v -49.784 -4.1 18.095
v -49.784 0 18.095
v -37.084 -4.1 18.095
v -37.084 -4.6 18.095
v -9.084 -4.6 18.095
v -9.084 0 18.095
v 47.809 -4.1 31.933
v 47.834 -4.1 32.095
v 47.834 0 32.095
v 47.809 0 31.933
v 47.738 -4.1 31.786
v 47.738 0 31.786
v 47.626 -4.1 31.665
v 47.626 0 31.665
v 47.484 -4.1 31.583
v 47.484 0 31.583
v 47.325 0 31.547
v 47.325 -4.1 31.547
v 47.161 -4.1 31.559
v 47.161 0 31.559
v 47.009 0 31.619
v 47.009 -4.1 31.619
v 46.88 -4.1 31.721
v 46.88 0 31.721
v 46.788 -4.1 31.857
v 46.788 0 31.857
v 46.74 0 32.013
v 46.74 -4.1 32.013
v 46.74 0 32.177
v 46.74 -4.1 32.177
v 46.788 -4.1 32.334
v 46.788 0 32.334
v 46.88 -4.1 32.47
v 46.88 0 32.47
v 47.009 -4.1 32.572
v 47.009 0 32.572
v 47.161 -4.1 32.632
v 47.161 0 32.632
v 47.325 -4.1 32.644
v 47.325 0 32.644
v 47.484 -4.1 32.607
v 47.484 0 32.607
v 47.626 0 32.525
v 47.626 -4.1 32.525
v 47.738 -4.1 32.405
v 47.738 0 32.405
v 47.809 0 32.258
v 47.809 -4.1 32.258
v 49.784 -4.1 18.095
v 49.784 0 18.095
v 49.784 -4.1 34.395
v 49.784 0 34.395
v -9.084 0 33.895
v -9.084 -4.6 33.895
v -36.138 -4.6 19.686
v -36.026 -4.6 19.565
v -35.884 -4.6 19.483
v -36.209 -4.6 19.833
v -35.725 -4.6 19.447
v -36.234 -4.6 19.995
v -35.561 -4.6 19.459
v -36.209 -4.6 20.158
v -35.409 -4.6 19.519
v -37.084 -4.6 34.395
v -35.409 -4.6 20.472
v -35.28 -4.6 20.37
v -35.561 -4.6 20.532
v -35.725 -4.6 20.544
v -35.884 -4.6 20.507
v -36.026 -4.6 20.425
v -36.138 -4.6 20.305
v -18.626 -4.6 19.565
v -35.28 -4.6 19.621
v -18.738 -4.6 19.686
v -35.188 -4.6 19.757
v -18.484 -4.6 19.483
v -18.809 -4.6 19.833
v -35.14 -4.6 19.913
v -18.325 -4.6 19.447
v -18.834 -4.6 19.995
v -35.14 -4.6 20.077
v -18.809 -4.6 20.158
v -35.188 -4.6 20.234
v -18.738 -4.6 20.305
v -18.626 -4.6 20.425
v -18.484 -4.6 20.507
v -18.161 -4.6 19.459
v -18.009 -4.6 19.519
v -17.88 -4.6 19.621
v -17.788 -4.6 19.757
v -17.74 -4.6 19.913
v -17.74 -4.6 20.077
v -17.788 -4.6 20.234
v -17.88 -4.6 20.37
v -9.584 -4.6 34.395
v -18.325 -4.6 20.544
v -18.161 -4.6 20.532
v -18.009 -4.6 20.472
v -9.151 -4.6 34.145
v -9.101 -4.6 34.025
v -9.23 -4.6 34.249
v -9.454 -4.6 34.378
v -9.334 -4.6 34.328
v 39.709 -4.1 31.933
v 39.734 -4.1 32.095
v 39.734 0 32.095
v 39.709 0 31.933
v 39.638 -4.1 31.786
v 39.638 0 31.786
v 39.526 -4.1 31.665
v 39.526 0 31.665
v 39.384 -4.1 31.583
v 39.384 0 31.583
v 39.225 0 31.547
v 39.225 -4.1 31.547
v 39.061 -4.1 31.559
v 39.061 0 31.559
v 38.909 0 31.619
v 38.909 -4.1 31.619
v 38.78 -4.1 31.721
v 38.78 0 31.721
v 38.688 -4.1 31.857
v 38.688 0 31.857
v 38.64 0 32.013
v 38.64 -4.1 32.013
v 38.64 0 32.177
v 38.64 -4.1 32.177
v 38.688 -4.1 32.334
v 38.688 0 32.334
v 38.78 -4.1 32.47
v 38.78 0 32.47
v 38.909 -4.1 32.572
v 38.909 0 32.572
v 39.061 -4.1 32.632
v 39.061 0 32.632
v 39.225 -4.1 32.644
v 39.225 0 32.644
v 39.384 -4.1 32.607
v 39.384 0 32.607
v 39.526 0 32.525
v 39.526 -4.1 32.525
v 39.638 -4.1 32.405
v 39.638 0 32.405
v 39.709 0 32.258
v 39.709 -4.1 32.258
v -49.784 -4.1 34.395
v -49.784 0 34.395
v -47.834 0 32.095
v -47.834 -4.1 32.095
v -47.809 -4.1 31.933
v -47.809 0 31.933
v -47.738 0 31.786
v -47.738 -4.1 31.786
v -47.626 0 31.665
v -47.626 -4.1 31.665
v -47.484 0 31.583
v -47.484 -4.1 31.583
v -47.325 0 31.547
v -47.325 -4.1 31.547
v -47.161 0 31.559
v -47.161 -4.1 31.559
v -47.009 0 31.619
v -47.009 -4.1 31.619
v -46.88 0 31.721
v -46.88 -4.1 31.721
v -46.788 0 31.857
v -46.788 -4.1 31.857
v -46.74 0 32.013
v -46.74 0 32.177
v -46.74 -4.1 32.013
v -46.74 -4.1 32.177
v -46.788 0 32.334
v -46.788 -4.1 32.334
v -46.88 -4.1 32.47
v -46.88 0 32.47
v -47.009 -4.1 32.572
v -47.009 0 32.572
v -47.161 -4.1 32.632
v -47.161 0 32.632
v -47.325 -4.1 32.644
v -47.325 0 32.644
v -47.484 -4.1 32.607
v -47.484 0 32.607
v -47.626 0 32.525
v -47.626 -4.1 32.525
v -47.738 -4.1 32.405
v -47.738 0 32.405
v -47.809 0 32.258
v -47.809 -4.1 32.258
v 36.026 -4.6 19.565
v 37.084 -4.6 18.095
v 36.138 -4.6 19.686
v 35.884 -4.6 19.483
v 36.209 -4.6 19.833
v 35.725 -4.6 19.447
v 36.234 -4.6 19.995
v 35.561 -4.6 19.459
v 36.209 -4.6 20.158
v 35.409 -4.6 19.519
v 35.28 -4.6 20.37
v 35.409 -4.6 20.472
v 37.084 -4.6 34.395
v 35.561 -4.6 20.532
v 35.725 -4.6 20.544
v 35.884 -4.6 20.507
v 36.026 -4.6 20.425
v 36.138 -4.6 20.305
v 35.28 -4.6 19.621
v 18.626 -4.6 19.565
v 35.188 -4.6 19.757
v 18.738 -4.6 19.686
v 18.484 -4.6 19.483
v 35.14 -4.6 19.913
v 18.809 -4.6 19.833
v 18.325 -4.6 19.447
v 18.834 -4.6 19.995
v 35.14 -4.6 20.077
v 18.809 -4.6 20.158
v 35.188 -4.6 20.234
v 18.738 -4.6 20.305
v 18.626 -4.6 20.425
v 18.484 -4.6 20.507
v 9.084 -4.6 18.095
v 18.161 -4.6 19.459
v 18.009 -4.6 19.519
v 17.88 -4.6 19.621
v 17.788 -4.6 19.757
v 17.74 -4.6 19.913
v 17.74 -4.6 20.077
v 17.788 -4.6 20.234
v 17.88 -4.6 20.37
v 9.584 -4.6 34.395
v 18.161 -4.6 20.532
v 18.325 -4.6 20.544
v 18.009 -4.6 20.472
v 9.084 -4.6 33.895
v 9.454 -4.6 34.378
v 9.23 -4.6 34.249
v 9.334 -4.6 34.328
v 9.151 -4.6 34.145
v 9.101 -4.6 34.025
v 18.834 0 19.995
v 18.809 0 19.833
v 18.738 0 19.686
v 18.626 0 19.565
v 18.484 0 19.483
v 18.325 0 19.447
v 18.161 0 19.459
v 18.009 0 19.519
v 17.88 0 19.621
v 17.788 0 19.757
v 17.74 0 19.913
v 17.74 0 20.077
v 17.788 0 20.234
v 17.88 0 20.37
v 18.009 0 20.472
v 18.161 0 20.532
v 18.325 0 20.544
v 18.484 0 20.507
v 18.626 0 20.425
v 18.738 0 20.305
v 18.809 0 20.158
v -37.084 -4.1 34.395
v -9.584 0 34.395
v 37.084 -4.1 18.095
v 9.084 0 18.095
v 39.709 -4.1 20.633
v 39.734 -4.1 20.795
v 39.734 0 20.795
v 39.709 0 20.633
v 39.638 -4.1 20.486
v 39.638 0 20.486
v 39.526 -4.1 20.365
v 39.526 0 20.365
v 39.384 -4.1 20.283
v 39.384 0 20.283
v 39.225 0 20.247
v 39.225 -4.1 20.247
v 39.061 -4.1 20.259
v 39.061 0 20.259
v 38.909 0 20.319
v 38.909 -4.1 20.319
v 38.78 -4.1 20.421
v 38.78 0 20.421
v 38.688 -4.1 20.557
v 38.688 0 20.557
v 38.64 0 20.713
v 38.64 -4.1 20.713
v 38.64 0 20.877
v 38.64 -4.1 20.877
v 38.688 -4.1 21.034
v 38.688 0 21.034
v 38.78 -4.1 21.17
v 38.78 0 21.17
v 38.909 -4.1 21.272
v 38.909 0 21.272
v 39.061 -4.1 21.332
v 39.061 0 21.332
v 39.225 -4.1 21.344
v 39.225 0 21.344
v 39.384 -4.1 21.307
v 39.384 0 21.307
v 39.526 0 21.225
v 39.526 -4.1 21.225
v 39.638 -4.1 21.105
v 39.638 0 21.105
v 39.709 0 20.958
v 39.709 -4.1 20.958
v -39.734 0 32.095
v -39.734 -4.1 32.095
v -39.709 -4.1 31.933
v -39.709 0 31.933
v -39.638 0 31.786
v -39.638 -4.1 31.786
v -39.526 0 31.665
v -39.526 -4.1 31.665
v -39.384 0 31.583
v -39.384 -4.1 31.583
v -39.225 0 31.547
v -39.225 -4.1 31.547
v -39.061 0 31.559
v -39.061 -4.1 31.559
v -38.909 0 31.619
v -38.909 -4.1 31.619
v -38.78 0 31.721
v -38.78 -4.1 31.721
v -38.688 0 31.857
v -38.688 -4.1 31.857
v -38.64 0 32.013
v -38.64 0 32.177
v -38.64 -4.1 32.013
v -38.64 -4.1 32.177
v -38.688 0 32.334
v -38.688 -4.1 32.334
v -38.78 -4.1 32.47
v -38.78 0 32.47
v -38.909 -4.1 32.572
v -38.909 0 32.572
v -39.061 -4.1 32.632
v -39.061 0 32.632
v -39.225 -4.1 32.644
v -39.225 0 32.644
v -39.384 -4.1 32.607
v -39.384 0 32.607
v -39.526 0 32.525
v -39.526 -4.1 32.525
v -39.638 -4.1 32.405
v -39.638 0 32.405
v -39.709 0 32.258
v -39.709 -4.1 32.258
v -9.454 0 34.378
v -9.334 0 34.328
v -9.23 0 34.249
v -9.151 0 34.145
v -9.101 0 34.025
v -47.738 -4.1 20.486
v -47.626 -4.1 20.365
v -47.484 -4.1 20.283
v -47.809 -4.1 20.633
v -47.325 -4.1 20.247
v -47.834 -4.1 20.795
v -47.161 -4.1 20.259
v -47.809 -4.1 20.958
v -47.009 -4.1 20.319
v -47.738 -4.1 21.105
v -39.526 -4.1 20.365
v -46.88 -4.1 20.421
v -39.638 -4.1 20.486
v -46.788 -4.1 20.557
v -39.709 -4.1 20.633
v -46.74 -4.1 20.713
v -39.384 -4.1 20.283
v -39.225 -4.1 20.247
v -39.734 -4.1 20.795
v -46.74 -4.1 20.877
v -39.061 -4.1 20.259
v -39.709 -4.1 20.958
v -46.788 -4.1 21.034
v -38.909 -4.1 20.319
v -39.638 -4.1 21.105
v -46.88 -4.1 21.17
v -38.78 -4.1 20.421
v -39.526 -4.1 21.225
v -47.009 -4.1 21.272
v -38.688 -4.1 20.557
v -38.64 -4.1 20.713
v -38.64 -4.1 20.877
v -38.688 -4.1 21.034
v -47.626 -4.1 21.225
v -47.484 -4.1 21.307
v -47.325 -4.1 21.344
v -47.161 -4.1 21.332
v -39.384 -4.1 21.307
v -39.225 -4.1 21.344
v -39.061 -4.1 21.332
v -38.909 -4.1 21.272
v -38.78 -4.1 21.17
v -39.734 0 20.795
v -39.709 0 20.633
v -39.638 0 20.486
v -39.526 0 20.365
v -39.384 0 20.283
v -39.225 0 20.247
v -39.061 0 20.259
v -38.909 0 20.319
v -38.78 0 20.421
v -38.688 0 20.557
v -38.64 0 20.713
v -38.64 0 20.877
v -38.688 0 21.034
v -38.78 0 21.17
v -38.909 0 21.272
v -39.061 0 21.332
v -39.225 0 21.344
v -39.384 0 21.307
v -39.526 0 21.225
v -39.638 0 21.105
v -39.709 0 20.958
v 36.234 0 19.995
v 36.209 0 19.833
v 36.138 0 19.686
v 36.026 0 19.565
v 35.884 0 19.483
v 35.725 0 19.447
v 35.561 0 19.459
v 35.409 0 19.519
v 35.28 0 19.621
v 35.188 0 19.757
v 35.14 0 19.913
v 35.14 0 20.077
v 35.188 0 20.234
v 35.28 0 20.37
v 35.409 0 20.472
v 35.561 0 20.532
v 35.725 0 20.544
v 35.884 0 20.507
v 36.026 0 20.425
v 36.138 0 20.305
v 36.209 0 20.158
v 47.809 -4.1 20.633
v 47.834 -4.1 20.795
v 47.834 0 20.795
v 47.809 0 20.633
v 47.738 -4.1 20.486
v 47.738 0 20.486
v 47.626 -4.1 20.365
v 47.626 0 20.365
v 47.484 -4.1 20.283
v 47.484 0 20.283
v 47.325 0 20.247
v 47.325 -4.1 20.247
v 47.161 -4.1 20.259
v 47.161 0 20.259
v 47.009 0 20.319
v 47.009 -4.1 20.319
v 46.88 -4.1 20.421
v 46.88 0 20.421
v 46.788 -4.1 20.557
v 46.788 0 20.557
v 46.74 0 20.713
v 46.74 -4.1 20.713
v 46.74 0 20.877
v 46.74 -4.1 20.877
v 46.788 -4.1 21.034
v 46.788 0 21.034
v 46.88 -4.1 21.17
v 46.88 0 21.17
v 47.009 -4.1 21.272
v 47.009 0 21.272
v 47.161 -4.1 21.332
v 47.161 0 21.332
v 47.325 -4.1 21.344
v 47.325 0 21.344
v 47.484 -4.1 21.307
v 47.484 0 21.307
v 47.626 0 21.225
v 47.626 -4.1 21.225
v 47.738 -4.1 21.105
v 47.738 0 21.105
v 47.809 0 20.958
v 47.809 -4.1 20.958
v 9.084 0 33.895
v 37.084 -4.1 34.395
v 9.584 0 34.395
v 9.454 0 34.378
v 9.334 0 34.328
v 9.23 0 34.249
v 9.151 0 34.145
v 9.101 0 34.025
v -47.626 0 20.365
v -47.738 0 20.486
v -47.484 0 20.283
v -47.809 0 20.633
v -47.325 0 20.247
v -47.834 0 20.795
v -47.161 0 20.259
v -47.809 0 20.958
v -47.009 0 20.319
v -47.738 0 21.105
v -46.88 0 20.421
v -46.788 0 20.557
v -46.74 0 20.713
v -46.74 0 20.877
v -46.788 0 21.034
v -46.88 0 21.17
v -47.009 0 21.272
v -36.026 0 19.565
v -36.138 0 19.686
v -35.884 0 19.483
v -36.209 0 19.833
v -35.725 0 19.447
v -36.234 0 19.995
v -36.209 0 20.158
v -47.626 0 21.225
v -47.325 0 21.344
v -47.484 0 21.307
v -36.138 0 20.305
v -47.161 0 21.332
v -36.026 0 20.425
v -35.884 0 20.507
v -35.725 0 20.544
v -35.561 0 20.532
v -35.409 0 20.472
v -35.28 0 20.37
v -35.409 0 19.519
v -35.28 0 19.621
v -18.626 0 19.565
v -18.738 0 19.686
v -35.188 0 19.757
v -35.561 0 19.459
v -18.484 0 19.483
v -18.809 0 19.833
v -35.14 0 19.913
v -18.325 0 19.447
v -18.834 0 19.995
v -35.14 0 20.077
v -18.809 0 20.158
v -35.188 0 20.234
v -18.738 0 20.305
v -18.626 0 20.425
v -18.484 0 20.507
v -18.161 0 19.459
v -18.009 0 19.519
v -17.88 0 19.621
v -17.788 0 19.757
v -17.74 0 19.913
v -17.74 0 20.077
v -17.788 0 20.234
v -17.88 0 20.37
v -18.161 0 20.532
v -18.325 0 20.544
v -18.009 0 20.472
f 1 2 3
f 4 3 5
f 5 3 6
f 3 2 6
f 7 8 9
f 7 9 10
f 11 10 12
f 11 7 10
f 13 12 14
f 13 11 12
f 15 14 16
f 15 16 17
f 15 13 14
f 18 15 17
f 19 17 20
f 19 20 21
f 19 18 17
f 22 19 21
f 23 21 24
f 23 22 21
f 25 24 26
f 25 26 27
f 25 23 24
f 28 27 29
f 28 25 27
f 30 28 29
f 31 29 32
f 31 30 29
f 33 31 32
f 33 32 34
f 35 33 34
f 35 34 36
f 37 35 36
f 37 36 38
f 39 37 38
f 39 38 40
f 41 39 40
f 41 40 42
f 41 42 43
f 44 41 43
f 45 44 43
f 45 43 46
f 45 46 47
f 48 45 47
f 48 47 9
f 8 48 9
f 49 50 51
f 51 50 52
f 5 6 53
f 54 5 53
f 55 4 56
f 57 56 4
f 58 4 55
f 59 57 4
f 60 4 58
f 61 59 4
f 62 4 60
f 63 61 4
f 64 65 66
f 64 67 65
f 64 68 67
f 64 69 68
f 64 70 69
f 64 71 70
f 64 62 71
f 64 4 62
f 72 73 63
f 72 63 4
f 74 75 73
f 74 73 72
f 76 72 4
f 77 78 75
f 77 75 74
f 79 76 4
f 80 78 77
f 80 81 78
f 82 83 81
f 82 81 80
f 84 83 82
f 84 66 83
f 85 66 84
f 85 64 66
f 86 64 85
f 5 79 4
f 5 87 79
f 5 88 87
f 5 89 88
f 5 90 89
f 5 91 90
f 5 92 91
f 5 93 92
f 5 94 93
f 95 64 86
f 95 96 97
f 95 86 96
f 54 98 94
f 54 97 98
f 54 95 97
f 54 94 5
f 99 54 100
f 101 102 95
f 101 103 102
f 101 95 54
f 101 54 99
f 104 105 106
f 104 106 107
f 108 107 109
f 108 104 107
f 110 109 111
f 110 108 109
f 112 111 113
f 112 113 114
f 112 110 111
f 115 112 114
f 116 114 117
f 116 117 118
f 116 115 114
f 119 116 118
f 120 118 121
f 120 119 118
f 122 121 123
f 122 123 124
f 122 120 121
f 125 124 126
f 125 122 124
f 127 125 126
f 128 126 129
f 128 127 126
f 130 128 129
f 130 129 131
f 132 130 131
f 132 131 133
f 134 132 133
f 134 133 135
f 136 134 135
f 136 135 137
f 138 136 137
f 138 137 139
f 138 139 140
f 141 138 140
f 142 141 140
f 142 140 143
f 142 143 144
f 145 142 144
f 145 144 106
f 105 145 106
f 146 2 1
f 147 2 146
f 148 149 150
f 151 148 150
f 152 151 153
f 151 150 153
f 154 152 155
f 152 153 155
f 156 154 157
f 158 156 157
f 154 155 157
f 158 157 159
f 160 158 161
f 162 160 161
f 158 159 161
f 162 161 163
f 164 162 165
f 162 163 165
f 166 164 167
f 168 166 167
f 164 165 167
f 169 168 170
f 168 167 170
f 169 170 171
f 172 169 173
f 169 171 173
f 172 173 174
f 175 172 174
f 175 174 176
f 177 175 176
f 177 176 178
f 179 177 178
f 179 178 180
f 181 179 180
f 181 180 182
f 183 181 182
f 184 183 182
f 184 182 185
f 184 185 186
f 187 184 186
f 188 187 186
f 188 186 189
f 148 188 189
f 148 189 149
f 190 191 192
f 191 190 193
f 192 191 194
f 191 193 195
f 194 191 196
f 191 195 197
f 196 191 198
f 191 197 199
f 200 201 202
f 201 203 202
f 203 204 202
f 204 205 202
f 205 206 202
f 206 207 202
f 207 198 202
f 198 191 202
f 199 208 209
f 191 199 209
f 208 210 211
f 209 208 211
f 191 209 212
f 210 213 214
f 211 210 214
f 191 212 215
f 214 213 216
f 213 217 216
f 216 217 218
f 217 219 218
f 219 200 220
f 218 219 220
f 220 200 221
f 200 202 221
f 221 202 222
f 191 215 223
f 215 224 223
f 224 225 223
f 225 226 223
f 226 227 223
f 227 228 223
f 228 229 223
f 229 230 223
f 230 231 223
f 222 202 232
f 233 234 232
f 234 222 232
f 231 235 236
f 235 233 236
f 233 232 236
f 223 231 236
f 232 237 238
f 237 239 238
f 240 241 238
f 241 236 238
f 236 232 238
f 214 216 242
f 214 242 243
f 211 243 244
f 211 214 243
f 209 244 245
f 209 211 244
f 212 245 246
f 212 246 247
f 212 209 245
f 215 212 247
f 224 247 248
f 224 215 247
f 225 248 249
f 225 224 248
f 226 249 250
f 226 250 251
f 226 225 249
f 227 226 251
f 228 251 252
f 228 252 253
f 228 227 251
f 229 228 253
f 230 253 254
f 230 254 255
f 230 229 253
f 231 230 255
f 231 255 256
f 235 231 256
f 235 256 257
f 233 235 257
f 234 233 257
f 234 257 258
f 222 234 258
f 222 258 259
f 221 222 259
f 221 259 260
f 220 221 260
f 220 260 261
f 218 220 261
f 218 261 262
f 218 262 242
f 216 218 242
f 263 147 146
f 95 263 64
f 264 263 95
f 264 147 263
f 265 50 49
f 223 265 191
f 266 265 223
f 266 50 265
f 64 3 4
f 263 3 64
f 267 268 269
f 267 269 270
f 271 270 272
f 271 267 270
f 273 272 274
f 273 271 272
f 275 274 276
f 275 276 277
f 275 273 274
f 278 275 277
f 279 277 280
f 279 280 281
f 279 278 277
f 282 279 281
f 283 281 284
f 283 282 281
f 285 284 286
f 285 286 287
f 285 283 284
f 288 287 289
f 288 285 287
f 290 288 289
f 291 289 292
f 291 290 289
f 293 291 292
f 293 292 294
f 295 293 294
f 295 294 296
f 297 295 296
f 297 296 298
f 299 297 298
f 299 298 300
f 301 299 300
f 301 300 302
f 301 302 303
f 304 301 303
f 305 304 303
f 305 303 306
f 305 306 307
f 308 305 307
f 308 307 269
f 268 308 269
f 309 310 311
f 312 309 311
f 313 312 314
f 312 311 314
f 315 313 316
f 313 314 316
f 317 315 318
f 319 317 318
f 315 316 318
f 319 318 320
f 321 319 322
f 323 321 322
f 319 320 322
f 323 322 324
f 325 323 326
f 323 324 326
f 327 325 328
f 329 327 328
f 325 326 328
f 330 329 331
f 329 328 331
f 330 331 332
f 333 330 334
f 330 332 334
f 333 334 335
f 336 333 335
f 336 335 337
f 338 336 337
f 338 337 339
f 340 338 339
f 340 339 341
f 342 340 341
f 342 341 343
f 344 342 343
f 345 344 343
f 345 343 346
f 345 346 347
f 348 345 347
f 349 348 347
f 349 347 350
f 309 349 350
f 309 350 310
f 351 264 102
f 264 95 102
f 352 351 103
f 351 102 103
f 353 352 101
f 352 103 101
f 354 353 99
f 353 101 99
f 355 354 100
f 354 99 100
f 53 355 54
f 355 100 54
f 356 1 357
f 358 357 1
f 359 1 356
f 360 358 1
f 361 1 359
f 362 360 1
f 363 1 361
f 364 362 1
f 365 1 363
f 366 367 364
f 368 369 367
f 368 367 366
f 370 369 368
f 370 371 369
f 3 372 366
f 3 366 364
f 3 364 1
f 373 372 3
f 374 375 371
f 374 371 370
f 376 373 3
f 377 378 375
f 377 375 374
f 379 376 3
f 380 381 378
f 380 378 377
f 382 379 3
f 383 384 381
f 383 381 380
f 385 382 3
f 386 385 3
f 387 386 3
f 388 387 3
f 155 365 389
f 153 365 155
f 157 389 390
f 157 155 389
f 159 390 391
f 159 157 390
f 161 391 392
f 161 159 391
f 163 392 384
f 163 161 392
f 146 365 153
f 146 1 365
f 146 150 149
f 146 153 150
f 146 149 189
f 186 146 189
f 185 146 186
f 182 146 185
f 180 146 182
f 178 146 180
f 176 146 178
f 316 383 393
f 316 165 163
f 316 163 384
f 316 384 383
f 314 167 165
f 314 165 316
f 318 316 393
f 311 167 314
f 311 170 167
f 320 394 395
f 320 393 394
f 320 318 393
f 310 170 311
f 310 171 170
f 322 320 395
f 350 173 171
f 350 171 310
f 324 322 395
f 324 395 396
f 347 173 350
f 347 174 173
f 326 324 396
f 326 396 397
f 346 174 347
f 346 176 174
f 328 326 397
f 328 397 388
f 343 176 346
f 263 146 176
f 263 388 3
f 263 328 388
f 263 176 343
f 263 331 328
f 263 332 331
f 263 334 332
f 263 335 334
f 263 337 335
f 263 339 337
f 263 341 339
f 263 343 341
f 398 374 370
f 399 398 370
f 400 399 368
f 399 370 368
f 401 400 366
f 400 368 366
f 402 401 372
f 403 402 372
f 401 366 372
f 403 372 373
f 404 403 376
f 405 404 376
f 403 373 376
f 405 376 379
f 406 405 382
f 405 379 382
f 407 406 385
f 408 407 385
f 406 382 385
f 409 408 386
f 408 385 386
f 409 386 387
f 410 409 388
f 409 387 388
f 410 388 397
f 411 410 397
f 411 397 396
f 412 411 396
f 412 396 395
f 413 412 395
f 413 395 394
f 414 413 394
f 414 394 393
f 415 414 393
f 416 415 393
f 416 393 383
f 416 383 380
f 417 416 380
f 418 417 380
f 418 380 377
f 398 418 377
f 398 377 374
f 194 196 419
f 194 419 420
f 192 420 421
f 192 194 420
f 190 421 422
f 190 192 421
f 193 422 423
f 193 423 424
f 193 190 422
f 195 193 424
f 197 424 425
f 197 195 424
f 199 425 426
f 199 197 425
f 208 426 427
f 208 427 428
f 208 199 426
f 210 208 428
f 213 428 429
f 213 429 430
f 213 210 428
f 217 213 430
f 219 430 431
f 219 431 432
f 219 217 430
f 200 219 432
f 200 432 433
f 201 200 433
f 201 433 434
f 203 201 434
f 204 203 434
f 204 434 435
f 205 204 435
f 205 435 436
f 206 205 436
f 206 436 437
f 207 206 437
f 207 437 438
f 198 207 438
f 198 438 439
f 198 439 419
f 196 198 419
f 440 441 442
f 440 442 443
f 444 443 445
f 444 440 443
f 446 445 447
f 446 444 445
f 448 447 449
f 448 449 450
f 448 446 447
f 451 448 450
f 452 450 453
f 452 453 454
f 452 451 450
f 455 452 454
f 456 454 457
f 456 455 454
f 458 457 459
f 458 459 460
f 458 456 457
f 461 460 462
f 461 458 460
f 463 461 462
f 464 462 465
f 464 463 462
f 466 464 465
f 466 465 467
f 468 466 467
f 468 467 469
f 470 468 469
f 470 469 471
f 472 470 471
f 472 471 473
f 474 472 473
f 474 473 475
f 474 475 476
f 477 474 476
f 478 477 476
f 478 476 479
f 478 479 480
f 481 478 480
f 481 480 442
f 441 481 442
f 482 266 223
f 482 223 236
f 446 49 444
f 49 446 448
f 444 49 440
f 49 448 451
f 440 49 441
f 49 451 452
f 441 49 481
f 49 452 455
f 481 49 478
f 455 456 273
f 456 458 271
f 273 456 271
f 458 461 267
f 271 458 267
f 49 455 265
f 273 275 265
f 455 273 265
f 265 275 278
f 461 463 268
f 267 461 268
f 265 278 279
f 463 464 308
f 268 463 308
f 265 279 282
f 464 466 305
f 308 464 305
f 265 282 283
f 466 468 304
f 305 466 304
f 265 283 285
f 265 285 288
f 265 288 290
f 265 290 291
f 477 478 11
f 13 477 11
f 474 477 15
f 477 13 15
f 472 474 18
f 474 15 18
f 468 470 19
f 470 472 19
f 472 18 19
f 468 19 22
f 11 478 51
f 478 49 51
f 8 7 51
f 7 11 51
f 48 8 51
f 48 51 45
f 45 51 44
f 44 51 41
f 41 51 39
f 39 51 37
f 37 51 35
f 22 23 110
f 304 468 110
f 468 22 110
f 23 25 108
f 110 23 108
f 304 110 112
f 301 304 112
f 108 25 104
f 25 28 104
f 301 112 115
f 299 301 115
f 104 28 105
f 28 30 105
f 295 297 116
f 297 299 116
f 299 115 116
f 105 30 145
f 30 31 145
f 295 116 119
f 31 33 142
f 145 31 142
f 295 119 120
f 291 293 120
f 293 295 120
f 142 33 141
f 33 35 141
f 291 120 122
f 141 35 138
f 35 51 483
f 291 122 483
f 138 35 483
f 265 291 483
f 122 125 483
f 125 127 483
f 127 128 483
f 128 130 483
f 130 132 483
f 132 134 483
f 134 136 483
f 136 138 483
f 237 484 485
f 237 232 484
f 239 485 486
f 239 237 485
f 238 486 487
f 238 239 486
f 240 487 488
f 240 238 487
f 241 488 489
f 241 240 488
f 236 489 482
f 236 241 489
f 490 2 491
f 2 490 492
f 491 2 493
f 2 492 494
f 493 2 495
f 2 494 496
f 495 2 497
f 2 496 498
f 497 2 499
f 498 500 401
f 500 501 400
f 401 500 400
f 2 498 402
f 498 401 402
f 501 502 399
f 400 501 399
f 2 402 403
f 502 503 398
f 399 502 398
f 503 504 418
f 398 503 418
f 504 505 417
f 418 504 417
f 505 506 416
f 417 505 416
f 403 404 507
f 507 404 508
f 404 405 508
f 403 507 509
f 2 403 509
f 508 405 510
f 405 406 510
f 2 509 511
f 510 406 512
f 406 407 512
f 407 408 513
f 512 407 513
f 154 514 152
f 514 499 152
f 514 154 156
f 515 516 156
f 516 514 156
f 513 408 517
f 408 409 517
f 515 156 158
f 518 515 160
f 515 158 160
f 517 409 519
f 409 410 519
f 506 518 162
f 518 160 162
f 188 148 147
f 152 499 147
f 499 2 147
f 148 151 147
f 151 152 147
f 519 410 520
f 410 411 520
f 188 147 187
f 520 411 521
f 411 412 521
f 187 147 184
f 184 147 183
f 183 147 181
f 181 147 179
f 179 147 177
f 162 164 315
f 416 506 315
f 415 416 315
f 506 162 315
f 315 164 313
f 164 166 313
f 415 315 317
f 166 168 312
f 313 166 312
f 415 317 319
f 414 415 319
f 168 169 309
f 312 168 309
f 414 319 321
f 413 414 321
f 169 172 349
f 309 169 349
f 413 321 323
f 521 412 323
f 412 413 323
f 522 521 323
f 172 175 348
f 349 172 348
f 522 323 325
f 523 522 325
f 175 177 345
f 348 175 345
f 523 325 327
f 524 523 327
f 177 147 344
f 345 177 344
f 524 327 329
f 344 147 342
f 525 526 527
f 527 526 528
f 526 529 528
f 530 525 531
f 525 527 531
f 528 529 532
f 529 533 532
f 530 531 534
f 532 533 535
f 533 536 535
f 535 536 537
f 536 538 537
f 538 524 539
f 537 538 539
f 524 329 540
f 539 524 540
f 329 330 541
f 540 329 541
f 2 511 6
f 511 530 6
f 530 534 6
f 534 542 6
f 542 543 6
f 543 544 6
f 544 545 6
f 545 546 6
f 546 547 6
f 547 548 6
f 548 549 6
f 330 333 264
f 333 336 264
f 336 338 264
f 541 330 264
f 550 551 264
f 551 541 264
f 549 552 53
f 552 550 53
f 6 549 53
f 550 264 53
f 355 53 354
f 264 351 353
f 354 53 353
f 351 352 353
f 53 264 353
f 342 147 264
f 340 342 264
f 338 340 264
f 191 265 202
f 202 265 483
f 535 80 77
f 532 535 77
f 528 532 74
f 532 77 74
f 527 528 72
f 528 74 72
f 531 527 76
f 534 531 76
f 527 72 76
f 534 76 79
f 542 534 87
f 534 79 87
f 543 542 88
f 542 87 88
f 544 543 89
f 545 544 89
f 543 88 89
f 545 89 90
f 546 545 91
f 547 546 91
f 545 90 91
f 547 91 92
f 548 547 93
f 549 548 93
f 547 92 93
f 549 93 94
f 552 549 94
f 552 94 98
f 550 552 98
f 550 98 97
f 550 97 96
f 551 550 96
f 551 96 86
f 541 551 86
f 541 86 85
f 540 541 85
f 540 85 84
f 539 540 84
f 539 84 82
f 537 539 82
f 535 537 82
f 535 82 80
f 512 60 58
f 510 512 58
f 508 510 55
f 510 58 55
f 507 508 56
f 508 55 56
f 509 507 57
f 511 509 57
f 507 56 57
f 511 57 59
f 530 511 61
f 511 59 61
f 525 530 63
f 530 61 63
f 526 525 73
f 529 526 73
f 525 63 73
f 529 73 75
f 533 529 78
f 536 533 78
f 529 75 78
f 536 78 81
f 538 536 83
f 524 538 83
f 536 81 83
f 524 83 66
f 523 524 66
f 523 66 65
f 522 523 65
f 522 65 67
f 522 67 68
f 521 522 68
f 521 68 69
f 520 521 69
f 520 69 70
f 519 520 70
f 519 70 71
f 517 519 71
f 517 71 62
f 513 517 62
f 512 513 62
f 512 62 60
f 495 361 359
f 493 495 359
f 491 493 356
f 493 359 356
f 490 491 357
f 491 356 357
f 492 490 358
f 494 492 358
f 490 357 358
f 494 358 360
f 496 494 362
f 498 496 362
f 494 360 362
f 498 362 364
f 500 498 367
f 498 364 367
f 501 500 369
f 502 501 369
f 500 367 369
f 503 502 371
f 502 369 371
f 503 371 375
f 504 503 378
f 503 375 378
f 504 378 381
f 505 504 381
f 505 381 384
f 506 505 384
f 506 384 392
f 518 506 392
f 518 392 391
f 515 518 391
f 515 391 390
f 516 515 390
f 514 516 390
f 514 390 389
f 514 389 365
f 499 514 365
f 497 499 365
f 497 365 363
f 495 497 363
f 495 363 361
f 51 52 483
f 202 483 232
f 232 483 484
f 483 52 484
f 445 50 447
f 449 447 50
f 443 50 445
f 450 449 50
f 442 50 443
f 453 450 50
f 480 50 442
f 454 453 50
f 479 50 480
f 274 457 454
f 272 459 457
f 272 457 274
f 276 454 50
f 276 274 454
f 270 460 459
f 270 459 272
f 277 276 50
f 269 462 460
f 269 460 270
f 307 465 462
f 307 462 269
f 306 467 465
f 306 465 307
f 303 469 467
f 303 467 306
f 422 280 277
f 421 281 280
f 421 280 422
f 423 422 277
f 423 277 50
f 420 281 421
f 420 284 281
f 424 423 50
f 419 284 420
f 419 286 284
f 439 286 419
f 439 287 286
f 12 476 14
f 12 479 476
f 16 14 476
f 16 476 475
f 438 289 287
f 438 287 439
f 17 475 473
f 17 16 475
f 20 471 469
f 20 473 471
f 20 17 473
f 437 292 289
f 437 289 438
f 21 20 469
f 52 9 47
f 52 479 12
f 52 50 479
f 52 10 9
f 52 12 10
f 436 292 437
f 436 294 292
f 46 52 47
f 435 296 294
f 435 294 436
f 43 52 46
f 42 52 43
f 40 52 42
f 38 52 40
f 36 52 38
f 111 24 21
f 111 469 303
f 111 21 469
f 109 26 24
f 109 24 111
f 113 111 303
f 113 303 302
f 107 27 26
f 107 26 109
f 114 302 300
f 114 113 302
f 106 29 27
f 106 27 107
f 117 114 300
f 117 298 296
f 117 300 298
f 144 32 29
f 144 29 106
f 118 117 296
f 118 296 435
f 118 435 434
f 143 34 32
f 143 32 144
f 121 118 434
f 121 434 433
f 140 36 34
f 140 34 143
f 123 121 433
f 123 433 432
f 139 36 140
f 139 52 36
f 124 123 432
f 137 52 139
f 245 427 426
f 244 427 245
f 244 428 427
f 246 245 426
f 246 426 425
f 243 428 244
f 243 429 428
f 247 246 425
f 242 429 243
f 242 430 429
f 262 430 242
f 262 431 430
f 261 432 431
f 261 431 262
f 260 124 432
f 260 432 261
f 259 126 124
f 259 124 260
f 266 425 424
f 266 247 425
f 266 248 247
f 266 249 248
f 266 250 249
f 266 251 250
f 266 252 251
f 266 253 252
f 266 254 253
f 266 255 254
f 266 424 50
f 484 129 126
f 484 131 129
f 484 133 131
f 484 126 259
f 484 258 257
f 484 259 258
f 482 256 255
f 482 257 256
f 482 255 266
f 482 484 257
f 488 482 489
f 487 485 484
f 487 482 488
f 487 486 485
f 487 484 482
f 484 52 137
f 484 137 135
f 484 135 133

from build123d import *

# Parameters (mm, degrees)
F0_W     = 28
F0_H     = 16.3
F1_DEPTH = 4.6
F0_W_2   = 12.7
F2_DEPTH = 4.1
F3_D     = 1.1
F4_R     = 0.5


with BuildPart() as f1:
    # F0 (on Front) → F1 (new body)
    with BuildSketch(Plane.XZ):
        with Locations((-23.0835460886, 26.2454546378)):
            Rectangle(F0_W, F0_H)
    extrude(amount=F1_DEPTH)

    # F0 (on Front) → F2 (join)
    with BuildSketch(Plane.XZ):
        with Locations((-43.4335460886, 26.2454546378)):
            Rectangle(F0_W_2, F0_H)
    extrude(amount=F2_DEPTH)

    # F3 (through all)
    with Locations(Plane(origin=(0, 0, 0), x_dir=(1, 0, 0), z_dir=(0, 1, 0))):
        with Locations((-39.1835460886, -32.0954546378), (-47.2835460886, -32.0954546378), (-47.2835460886, -20.7954546378), (-39.1835460886, -20.7954546378), (-35.6835460886, -19.9954546378), (-18.2835460886, -19.9954546378)):
            Hole(F3_D / 2)

    # F4
    f4_edges = [f1.edges().sort_by_distance(p)[0] for p in [
        (-9.083546, -2.3, 34.395455),
    ]]
    fillet(f4_edges, radius=F4_R)


with BuildPart() as f5_1:
    # F5: instance of F1
    add(f1.part.mirror(Plane.YZ))


solid = Compound([f1.part, f5_1.part])
